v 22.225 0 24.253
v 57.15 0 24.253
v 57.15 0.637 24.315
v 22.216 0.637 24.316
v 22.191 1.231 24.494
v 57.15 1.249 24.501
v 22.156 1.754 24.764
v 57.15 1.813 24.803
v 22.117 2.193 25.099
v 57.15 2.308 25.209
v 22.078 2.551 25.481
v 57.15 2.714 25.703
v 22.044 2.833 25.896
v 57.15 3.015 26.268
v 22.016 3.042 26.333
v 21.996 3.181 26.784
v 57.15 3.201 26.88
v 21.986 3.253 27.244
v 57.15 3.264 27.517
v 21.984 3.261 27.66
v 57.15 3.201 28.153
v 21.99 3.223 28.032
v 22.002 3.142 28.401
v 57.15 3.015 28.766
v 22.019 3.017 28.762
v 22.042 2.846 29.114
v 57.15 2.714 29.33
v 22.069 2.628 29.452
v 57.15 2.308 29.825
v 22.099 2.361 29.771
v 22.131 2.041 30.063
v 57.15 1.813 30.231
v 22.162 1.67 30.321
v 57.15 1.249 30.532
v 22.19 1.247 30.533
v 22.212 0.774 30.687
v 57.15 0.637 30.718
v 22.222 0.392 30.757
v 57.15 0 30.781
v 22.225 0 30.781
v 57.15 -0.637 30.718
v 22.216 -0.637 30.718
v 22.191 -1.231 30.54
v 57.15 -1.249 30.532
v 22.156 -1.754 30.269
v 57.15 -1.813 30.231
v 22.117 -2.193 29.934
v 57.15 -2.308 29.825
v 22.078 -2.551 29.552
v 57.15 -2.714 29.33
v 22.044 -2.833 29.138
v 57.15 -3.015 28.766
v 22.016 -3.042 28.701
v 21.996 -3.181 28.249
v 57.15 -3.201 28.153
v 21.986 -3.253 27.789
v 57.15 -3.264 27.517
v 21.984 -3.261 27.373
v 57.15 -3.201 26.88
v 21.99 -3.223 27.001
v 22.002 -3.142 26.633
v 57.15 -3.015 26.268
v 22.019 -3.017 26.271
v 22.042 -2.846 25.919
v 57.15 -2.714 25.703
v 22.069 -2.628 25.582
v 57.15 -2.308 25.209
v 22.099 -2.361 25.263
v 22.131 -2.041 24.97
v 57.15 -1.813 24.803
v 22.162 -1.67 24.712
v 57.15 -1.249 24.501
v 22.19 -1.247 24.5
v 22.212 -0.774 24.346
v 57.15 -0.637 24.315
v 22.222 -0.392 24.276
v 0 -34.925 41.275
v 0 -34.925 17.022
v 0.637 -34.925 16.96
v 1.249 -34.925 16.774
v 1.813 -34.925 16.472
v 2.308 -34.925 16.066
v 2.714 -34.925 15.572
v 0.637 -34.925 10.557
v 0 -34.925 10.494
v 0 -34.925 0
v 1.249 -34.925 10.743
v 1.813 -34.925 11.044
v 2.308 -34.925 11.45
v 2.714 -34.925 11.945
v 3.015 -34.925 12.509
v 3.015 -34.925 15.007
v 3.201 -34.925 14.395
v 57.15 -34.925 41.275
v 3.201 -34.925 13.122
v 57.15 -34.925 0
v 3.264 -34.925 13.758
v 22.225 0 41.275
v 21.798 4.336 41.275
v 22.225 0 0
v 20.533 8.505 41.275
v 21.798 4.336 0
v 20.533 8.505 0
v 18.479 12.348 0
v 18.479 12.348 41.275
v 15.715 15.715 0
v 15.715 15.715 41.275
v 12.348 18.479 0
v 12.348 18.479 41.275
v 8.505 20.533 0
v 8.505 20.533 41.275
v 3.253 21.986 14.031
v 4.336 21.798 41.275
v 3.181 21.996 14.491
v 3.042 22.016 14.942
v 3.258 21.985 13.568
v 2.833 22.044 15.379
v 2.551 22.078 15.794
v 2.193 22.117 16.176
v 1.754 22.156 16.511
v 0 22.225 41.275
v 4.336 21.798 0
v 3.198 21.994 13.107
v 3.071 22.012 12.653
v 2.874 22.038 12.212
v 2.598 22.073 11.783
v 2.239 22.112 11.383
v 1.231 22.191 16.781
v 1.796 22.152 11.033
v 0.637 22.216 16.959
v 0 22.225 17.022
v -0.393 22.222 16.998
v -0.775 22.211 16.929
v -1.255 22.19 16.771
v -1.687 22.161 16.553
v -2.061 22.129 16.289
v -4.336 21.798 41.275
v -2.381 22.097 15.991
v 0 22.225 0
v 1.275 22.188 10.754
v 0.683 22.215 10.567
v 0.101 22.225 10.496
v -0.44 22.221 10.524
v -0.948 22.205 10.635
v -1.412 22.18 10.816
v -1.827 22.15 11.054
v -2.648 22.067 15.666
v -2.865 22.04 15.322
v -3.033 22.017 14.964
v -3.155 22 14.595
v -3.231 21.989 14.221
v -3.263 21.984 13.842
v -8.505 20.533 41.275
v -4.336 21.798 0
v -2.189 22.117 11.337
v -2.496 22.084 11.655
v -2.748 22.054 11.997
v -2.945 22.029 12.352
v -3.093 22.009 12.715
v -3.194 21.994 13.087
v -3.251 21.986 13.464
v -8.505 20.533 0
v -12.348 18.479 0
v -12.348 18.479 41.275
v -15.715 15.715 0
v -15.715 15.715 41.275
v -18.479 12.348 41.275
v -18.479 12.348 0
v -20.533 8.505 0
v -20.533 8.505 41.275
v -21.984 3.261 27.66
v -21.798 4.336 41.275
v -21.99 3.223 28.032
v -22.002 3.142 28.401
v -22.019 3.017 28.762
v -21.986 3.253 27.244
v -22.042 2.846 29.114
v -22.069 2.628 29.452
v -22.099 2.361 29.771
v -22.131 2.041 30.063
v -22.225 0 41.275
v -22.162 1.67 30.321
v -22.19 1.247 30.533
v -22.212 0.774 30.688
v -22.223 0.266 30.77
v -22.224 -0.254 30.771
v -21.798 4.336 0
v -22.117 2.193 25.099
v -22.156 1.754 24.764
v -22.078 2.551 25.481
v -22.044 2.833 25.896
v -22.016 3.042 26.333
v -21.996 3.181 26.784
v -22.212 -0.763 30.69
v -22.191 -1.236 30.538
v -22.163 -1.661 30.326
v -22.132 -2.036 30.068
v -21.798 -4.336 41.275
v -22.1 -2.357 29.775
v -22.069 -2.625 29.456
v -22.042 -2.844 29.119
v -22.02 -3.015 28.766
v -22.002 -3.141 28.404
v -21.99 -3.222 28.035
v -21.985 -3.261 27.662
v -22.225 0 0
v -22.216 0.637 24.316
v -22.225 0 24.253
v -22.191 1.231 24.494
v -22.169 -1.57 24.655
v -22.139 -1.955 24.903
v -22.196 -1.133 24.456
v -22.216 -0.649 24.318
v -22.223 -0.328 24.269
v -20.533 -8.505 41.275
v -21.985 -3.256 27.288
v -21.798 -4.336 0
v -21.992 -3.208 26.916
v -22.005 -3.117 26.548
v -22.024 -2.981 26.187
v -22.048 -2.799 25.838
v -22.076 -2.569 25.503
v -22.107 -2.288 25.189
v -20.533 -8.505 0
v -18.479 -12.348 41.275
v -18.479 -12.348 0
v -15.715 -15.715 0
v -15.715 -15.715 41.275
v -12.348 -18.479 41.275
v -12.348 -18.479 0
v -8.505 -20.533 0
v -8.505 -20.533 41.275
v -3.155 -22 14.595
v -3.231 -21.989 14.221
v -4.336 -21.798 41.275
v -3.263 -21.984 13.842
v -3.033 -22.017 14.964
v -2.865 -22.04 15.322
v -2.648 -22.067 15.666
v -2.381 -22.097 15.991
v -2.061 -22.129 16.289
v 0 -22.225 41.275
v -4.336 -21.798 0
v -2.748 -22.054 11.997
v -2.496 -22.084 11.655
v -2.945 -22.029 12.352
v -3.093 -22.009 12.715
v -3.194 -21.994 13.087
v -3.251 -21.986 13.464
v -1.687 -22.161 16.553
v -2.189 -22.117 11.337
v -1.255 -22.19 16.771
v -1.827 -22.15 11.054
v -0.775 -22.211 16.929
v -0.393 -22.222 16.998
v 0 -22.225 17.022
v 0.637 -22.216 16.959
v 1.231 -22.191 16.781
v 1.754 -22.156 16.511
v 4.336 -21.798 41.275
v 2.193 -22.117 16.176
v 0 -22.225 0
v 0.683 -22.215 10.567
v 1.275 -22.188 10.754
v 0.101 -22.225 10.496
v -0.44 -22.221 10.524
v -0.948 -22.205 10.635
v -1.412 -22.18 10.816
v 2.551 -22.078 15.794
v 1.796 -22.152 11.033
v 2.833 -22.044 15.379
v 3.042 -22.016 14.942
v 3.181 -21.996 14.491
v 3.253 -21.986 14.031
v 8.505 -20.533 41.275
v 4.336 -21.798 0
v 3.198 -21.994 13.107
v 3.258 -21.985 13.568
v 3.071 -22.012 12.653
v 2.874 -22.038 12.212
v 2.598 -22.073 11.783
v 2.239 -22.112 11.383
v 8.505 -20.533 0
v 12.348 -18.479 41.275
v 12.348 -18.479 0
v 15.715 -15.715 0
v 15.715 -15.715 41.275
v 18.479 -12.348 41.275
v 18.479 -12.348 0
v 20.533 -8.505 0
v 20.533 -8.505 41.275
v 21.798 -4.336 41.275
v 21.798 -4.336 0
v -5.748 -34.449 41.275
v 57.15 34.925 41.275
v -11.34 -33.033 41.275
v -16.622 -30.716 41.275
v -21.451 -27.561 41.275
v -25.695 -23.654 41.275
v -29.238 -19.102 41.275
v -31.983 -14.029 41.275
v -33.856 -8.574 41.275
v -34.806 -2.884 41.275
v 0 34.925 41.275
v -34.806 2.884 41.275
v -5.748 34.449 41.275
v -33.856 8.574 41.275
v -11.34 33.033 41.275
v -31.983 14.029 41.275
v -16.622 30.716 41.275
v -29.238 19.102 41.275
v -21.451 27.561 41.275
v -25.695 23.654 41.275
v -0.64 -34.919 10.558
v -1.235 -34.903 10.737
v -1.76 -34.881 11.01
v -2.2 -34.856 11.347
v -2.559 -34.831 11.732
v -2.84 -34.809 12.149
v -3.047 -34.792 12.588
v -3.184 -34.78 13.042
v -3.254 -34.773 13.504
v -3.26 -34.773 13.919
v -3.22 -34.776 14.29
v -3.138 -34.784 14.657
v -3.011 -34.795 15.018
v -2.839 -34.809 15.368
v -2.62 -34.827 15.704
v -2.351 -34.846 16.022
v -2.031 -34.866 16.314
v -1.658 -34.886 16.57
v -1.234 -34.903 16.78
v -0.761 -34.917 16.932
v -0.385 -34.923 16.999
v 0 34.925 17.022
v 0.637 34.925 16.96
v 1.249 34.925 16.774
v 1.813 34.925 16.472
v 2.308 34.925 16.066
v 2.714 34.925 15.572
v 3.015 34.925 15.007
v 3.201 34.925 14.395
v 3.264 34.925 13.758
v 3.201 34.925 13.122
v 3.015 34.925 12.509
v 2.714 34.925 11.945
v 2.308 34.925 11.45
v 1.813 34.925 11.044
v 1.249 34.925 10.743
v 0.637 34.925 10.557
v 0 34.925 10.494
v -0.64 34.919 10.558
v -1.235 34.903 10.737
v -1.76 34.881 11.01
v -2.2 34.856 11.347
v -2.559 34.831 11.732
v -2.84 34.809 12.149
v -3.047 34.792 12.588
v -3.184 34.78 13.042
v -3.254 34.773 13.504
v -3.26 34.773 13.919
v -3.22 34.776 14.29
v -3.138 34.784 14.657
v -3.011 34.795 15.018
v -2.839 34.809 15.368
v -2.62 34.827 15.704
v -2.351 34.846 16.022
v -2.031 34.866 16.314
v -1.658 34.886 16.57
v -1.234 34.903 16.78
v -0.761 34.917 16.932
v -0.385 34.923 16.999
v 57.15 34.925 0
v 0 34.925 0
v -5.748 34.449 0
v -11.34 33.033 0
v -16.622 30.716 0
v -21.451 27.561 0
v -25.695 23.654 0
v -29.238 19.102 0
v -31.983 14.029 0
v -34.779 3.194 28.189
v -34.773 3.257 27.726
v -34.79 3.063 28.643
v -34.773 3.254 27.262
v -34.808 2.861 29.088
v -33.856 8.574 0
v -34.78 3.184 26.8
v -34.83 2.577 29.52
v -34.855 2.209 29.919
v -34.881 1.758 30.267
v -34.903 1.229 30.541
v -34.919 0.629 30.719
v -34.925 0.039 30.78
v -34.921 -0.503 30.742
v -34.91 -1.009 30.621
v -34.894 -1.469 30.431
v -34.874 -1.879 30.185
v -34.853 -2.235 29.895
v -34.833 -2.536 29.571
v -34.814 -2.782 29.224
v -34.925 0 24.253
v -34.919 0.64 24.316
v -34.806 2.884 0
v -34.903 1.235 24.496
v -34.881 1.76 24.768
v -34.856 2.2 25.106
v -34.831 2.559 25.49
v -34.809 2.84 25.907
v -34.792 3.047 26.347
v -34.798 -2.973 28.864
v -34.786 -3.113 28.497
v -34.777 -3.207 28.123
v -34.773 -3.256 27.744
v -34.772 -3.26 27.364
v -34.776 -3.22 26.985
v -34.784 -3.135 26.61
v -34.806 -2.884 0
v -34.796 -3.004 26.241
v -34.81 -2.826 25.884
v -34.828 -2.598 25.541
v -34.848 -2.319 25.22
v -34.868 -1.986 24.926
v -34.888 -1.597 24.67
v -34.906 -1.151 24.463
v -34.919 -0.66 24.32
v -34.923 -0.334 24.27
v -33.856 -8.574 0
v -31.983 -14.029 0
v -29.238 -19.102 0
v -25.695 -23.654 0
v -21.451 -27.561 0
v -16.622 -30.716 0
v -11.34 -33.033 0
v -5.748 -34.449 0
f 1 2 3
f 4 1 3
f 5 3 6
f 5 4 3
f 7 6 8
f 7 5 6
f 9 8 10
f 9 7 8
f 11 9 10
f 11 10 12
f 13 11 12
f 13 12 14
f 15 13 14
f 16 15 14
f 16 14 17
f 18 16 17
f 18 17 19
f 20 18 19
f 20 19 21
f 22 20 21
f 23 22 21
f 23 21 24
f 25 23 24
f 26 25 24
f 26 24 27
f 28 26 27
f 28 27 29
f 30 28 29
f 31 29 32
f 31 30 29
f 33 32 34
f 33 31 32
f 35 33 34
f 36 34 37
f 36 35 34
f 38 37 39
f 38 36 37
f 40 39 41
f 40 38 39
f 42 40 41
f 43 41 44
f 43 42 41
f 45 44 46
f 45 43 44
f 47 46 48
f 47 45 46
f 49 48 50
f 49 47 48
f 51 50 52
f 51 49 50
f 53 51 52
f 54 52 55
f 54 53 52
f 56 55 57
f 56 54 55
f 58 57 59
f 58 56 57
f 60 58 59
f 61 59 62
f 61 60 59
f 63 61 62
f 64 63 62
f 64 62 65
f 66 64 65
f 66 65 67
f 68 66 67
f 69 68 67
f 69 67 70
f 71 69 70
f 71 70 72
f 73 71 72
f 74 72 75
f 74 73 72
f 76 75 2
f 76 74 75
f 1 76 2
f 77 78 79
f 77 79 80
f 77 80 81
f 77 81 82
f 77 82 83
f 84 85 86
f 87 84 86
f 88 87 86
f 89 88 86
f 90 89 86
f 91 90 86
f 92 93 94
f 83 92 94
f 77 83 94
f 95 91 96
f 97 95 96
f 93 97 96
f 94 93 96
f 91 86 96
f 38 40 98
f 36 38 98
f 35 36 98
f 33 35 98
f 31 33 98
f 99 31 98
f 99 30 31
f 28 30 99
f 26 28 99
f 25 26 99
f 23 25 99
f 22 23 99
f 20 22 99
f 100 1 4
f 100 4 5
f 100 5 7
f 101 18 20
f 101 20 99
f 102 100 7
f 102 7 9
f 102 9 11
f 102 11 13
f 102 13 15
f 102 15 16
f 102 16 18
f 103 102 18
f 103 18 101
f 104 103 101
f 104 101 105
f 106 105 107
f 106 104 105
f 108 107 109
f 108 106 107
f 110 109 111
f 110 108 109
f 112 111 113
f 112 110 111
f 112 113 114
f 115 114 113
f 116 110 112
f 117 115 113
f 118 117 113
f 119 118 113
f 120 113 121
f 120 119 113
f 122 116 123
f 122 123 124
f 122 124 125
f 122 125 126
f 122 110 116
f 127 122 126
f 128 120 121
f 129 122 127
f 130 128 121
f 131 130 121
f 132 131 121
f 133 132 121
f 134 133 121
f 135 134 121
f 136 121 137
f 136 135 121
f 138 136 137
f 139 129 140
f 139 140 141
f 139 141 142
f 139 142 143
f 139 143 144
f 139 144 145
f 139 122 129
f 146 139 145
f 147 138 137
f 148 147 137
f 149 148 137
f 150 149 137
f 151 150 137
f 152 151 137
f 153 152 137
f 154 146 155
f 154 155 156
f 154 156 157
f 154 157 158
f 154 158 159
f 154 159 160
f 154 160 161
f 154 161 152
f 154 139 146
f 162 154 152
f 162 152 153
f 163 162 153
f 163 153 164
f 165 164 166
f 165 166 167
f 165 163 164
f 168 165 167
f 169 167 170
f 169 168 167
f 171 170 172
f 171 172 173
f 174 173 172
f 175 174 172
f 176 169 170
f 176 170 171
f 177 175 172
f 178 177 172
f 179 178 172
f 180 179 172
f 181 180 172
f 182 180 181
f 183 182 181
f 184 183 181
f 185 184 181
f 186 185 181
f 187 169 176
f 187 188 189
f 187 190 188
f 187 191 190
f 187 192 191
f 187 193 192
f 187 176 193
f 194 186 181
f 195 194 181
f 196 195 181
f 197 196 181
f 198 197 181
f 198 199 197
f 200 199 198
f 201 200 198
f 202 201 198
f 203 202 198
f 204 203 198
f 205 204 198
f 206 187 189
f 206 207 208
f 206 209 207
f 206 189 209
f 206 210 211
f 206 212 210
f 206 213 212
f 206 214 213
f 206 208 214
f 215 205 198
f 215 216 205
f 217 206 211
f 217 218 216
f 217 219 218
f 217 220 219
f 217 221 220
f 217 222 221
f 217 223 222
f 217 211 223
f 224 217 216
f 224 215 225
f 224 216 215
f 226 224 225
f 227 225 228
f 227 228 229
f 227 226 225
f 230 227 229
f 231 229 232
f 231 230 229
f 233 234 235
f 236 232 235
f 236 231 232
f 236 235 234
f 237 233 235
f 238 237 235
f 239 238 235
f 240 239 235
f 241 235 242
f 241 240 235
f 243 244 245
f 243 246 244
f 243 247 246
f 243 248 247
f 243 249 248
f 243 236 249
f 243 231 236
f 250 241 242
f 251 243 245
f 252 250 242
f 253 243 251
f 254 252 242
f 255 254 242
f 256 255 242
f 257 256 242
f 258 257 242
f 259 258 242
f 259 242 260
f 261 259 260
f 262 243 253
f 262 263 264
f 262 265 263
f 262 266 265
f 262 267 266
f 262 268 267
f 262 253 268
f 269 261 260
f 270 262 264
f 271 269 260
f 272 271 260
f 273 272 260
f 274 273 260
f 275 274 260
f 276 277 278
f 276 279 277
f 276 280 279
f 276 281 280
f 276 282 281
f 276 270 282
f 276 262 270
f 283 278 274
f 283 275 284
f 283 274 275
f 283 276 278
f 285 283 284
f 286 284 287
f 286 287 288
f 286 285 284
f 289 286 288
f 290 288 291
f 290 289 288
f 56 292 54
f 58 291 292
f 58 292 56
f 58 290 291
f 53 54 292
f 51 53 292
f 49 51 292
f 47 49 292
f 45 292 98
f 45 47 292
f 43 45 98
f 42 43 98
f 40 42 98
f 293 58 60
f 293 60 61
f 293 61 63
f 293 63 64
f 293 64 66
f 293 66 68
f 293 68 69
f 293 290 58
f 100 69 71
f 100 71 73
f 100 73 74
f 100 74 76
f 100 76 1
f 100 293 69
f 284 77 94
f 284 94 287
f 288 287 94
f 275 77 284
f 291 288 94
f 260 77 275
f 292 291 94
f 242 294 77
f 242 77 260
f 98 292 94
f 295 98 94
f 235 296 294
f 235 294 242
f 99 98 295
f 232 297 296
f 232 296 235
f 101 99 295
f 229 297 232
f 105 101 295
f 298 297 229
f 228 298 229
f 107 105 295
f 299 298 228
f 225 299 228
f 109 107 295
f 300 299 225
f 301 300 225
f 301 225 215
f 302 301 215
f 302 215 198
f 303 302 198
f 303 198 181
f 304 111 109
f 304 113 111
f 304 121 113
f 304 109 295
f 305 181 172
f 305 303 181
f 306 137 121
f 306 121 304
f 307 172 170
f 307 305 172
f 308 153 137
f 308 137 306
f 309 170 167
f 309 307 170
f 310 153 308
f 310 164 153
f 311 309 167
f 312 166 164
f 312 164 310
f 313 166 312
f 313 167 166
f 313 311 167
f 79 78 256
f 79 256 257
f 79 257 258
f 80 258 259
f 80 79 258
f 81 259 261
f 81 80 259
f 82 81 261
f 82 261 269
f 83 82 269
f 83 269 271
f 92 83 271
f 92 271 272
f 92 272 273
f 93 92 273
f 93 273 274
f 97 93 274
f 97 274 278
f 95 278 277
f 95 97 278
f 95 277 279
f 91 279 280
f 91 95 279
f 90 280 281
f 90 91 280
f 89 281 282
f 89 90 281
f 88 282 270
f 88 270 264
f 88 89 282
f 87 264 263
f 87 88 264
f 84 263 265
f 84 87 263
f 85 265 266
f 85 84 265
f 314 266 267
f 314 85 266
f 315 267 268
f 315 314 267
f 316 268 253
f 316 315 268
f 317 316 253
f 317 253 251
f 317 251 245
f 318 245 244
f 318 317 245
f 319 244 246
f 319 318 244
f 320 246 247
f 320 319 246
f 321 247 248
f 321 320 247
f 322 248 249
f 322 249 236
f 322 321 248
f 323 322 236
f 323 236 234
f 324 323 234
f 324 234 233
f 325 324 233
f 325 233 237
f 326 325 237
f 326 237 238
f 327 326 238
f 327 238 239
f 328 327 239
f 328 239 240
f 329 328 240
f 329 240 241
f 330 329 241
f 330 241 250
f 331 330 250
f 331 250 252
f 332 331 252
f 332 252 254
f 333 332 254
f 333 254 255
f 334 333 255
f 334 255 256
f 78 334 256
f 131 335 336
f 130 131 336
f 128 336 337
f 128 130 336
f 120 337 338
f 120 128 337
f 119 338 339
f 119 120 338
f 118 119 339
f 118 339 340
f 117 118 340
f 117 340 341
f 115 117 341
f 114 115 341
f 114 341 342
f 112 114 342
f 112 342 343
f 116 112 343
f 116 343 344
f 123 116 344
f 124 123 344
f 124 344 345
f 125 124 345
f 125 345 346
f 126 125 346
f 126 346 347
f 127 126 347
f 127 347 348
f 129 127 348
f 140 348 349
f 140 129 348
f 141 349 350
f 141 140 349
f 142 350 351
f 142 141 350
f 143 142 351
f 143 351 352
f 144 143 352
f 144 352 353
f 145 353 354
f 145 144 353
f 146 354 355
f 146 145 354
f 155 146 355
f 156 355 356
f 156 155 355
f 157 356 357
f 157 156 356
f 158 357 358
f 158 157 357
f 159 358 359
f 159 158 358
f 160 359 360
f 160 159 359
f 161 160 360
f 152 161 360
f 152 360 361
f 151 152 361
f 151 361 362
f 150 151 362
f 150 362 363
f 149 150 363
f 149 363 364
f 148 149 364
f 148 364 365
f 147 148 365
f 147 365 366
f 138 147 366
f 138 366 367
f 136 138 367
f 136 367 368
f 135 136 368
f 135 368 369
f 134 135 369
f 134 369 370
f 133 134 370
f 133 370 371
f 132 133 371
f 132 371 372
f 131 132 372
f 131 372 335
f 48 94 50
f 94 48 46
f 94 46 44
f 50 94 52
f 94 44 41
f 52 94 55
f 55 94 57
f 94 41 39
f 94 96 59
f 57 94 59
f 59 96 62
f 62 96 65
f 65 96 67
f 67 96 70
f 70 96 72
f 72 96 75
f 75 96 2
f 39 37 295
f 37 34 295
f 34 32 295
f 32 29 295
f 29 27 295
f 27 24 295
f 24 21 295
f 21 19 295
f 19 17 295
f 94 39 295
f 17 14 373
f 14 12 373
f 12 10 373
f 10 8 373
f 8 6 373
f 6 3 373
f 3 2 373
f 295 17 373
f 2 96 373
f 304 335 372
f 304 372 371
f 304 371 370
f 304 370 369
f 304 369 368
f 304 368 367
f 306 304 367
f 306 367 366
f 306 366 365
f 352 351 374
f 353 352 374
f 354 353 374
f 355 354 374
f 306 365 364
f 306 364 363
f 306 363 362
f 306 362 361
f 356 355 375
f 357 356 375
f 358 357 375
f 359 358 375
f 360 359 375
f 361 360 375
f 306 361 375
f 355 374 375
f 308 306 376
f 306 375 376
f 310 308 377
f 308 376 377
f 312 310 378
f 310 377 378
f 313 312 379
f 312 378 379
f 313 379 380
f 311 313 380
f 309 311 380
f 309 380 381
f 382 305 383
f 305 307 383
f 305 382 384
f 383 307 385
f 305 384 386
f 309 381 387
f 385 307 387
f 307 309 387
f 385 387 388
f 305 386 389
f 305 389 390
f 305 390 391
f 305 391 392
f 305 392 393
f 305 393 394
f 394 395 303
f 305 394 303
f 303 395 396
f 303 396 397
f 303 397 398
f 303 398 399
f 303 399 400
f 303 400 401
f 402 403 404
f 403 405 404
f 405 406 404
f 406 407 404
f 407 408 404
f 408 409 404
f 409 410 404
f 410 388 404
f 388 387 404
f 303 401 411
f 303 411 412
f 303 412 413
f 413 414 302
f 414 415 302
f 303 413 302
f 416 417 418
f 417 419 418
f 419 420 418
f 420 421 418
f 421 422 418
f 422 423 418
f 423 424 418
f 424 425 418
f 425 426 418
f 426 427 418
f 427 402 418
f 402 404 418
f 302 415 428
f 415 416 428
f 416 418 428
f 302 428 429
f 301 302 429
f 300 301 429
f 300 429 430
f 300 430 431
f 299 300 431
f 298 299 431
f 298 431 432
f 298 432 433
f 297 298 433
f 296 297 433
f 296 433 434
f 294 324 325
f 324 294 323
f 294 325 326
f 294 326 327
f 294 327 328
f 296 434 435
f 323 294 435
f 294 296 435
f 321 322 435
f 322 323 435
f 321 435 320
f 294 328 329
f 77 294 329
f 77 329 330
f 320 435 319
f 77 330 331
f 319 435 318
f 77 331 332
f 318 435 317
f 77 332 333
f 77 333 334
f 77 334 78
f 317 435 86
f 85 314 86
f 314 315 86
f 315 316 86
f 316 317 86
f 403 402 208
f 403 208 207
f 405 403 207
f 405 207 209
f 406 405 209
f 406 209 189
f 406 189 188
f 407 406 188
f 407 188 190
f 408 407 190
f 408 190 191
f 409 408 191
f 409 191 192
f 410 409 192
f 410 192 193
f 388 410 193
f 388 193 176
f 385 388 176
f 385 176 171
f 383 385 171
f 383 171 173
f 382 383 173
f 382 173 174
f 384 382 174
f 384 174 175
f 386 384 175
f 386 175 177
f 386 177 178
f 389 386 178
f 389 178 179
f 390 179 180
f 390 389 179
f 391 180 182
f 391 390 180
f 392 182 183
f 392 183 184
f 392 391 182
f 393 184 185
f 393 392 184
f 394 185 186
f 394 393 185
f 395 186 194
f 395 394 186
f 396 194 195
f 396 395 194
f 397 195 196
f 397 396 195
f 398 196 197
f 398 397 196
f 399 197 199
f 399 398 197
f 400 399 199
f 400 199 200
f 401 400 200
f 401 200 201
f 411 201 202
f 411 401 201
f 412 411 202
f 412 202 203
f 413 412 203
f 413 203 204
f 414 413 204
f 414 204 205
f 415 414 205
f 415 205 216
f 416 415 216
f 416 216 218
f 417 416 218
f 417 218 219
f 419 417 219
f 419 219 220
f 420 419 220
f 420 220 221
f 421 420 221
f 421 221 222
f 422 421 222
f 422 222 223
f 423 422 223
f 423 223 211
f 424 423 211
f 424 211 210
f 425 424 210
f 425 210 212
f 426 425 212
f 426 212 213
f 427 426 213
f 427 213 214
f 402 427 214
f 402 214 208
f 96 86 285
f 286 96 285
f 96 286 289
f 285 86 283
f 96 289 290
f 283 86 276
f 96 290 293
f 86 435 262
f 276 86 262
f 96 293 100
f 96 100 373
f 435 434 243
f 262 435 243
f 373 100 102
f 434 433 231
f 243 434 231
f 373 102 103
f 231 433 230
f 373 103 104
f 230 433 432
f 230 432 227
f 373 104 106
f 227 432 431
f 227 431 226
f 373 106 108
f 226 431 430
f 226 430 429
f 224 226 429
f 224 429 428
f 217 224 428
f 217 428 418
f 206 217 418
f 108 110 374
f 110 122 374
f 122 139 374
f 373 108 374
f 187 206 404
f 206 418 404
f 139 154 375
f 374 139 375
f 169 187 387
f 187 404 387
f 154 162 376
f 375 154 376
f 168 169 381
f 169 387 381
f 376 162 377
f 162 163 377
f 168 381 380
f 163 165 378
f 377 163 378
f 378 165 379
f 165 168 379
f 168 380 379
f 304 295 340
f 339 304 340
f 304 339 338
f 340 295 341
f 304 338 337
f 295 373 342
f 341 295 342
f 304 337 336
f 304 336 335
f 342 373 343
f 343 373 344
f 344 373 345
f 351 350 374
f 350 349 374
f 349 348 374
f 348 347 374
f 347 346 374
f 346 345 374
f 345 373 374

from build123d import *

# Parameters (mm, degrees)
SKETCH1_R               = 22.225
BOSS_EXTRUDE1_DEPTH     = 41.275
CUT_EXTRUDE1_DEPTH      = 79.673399253
CUT_EXTRUDE1_DEPTH_BACK = 79.673399253
SKETCH2_R               = 3.2639
CUT_EXTRUDE2_DEPTH      = 79.673399422
CUT_EXTRUDE2_DEPTH_BACK = 79.673399422
SKETCH3_R               = 3.2639


with BuildPart() as part:
    # Sketch1 → Boss-Extrude1 (new body)
    with BuildSketch(Plane(origin=(0, 0, 0), x_dir=(0, 1, 0), z_dir=(0, 0, 1))):
        with BuildLine():
            Line((-34.925, 0), (-34.925, -57.15))
            Line((-34.925, -57.15), (34.925, -57.15))
            Line((34.925, -57.15), (34.925, 0))
            ThreePointArc((34.925, 0), (0, 34.925), (-34.925, 0))
        make_face()
        with Locations(Location((0, 0, 0), (0, 0, 270))):
            Circle(SKETCH1_R, mode=Mode.SUBTRACT)
    extrude(amount=BOSS_EXTRUDE1_DEPTH)

    # Sketch2 → Cut-Extrude1 (cut, two sides: drawn at the far end of the back side and taken through both)
    with BuildSketch(Plane.YZ.offset(-CUT_EXTRUDE1_DEPTH_BACK)):
        with Locations(Location((0, 27.516666667, 0), (0, 0, 270))):
            Circle(SKETCH2_R)
    extrude(amount=CUT_EXTRUDE1_DEPTH + CUT_EXTRUDE1_DEPTH_BACK, mode=Mode.SUBTRACT)

    # Sketch3 → Cut-Extrude2 (cut, two sides: drawn at the far end of the back side and taken through both)
    with BuildSketch(Plane(origin=(0, 0, 0), x_dir=(-1, 0, 0), z_dir=(0, 1, 0)).offset(-CUT_EXTRUDE2_DEPTH_BACK)):
        with Locations(Location((0, 13.758333333, 0), (0, 0, 90))):
            Circle(SKETCH3_R)
    extrude(amount=CUT_EXTRUDE2_DEPTH + CUT_EXTRUDE2_DEPTH_BACK, mode=Mode.SUBTRACT)


solid = part.part
